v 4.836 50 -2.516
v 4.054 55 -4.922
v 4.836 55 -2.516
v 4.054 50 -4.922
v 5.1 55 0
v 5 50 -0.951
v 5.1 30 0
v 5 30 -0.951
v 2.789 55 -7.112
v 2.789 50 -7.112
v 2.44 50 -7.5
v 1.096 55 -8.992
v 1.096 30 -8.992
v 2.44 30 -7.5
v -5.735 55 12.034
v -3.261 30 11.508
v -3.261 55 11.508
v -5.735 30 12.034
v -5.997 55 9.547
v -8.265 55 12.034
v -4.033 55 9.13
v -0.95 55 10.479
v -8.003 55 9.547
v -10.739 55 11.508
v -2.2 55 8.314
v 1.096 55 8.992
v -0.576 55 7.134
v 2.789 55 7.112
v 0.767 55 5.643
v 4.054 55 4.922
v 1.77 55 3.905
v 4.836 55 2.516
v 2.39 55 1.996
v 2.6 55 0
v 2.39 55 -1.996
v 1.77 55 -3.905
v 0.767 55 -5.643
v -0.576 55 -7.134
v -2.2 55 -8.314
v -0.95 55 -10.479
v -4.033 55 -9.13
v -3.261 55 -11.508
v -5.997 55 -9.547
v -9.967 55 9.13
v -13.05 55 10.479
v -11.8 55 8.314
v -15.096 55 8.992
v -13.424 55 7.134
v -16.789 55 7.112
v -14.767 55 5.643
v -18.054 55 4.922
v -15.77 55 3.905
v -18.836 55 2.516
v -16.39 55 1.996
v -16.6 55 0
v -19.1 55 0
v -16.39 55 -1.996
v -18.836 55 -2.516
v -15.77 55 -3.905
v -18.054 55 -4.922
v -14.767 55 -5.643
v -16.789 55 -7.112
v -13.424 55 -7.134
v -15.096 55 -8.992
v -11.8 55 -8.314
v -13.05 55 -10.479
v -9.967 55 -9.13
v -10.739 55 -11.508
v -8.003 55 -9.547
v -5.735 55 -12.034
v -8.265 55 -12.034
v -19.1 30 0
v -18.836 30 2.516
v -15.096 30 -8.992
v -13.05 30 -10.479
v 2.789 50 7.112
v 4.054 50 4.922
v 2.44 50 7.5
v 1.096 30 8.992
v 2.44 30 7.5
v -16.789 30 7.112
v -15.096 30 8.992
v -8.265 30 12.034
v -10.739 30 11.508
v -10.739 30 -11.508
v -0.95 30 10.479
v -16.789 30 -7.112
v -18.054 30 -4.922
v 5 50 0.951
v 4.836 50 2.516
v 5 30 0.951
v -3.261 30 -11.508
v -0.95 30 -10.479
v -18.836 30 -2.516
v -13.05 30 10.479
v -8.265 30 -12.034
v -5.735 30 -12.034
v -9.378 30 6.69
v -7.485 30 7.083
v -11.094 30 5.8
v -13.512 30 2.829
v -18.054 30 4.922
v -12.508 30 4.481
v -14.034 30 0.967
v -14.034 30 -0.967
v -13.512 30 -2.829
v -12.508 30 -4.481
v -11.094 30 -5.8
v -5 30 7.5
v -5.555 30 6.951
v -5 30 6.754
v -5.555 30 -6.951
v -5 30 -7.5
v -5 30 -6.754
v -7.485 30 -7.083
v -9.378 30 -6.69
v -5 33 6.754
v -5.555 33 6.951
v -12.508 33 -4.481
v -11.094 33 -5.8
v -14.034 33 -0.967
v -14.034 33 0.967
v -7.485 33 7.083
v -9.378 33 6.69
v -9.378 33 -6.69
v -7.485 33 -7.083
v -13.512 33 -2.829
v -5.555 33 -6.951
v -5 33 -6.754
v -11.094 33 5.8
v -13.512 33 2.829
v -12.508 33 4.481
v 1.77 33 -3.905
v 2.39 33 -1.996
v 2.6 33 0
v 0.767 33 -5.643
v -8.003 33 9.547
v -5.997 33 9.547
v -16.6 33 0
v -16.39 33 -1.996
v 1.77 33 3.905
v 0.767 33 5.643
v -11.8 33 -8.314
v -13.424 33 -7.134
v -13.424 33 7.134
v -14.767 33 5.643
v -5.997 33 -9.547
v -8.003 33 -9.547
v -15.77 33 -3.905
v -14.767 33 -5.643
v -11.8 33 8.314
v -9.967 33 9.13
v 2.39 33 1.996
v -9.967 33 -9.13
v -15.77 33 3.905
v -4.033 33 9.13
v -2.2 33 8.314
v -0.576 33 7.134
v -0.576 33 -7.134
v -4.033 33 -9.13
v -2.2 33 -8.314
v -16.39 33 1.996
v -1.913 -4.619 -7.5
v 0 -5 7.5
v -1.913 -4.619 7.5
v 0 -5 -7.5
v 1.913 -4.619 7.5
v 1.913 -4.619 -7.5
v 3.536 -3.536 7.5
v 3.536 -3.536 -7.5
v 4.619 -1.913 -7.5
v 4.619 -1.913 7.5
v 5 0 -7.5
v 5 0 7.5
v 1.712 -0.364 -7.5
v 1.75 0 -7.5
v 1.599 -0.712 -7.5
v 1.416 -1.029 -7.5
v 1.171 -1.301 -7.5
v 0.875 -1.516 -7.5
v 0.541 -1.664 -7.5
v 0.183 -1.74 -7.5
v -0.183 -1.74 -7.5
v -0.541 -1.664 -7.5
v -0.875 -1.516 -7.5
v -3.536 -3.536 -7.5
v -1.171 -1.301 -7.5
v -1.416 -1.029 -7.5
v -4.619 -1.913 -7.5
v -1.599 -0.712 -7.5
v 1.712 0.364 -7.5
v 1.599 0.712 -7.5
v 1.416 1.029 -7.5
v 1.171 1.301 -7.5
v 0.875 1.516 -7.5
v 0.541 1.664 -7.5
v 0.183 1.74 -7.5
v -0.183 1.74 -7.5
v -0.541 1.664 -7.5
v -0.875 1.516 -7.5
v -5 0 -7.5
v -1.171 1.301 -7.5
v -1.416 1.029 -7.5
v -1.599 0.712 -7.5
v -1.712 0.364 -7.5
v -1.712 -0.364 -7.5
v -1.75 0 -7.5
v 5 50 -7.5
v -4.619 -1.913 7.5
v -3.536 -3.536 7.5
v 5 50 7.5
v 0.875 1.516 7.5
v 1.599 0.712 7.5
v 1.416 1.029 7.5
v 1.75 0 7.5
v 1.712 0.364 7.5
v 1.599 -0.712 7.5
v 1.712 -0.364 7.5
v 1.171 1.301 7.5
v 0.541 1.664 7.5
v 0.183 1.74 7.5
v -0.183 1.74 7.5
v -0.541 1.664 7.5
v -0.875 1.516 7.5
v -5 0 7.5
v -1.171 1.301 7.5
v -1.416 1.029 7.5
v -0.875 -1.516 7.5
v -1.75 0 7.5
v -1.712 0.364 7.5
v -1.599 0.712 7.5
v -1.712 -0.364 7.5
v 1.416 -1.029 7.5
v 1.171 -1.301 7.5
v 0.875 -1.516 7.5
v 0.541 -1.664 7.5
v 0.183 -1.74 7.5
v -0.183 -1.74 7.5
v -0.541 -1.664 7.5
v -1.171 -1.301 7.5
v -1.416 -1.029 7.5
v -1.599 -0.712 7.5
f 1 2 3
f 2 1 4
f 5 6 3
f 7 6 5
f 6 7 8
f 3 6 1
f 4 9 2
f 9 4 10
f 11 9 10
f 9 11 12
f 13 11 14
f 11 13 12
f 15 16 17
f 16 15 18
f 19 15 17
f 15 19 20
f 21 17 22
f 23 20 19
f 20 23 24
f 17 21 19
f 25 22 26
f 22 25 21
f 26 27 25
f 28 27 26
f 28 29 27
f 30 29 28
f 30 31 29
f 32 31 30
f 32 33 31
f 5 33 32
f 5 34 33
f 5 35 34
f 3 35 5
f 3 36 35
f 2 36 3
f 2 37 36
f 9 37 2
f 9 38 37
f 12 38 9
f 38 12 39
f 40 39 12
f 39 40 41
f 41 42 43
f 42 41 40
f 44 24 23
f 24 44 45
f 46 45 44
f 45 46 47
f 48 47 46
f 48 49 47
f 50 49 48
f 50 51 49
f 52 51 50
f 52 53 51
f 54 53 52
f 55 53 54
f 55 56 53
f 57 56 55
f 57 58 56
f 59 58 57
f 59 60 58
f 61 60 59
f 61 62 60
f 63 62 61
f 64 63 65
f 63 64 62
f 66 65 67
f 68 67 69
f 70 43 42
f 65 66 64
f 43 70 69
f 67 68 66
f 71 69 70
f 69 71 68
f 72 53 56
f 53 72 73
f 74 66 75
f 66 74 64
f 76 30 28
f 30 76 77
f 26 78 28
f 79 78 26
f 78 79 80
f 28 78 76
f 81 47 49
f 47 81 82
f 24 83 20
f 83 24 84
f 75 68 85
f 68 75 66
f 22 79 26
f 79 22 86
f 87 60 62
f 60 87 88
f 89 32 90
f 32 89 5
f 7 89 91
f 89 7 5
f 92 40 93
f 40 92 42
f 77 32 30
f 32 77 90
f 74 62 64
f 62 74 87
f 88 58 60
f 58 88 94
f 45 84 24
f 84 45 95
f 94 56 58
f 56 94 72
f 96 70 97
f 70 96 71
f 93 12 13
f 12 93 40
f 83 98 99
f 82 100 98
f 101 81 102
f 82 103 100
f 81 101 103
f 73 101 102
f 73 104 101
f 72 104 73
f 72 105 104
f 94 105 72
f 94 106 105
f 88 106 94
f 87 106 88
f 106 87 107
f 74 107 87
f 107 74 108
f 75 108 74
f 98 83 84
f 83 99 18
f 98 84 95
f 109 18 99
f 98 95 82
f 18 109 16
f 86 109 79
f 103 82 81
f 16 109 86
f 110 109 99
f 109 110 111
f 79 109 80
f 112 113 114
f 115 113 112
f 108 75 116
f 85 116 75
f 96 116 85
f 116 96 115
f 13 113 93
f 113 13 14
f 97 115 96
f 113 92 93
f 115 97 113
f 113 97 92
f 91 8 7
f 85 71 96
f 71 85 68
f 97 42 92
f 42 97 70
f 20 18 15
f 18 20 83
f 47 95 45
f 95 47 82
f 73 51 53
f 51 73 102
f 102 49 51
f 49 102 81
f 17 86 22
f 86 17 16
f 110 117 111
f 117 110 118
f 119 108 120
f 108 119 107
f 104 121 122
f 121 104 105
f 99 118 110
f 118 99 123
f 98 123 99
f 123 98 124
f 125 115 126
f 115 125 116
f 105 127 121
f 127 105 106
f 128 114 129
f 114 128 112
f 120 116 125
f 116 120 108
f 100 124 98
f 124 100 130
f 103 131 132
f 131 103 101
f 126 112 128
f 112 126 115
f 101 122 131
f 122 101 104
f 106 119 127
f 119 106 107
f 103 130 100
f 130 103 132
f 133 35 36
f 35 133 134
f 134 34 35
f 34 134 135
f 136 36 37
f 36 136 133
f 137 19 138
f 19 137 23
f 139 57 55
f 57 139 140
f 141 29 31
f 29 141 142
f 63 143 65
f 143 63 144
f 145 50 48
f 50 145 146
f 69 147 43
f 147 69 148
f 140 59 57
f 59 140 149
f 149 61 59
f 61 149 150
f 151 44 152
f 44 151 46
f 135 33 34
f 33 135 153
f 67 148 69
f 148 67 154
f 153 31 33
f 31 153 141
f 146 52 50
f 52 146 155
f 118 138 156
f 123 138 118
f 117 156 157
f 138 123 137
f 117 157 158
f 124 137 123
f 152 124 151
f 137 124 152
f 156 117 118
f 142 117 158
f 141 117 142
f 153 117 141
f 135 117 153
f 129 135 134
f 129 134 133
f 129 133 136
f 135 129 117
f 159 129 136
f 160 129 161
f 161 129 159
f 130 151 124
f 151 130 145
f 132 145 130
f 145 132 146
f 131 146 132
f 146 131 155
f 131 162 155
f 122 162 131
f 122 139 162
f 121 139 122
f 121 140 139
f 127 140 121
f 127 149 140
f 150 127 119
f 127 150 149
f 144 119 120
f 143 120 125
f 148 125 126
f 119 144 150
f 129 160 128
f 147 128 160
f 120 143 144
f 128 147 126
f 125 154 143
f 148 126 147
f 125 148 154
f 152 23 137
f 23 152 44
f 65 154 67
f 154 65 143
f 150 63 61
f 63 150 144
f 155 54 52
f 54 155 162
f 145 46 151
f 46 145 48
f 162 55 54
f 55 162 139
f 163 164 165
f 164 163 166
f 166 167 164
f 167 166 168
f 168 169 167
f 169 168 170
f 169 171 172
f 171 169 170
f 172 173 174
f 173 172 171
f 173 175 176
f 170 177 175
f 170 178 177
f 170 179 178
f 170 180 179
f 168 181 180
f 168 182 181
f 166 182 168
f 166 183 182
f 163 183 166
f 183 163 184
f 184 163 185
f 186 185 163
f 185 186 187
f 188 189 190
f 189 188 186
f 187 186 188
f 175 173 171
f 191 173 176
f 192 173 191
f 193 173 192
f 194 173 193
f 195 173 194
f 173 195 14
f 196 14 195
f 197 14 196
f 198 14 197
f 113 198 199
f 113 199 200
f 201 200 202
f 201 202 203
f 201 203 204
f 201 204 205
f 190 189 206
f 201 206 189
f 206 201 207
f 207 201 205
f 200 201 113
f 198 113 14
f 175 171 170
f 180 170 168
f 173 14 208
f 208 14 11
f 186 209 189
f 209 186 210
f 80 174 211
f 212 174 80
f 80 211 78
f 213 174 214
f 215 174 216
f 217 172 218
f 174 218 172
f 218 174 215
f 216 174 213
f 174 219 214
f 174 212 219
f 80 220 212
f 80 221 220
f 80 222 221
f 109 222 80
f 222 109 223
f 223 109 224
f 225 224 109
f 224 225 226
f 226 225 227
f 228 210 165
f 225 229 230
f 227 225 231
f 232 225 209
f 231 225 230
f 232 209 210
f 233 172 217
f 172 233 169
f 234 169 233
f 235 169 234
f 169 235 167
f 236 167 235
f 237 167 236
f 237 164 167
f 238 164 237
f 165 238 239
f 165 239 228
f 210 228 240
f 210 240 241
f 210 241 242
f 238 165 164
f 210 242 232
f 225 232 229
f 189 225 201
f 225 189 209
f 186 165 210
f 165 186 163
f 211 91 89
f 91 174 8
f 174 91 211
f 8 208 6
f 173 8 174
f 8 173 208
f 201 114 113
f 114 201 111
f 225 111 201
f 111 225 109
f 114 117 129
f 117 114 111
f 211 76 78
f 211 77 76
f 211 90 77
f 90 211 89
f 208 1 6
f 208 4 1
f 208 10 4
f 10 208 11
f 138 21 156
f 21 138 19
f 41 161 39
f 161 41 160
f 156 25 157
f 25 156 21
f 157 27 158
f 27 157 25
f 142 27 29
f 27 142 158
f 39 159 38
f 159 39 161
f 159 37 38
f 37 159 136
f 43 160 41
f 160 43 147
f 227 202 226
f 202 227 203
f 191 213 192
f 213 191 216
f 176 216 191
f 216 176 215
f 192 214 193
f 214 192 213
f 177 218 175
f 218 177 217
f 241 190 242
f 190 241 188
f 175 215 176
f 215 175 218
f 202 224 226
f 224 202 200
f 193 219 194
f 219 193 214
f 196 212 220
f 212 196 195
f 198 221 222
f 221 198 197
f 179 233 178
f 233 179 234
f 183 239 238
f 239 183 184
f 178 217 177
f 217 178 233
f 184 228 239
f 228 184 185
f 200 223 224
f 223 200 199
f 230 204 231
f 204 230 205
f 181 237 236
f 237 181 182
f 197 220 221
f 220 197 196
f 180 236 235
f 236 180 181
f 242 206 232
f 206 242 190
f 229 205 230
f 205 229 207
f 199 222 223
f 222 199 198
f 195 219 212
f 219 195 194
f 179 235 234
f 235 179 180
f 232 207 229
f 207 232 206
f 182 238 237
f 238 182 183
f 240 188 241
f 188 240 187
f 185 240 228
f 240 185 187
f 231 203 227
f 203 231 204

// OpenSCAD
// file: lib.scad
OD = 24.5;

module tube(od, id, h){
  difference(){
    color([1, .3, .6])cylinder(d=od, h=h);
    translate([0, 0, -1])cylinder(d=id, h=h + 2);
  }
}
// main file
include <lib.scad>

//OD = 24.3;
OD = 19.2;
thickness = 5;
cam_w = 25;
cam_h = 24;

L = 50;

module unit(){
  //translate([-6, -21, 0])rotate([0, 90, 0])import("camera_mount.stl");
  translate([0, 0, -(cam_w-10)/2])color("red")cylinder(d=10, h=cam_w - 10);

  translate([-5, 0, -(cam_w-10)/2])cube([10, L, cam_w -10]);
  translate([-7, 30, 0])rotate([-90, 0, 0])
    difference(){
    cylinder(d=OD + thickness, h=25);
    translate([0, 0, -1])cylinder(d=OD-5, h=102);
    translate([0, 0, 3])cylinder(d=OD, h=102);
  }
}

difference(){
  unit();
  translate([-7, 33, 0])rotate([-90, 0, 0])cylinder(d=OD, h=100);
  translate([0, 0, -50])color("red")cylinder(d=3.5, h=100, $fn=30);
}
